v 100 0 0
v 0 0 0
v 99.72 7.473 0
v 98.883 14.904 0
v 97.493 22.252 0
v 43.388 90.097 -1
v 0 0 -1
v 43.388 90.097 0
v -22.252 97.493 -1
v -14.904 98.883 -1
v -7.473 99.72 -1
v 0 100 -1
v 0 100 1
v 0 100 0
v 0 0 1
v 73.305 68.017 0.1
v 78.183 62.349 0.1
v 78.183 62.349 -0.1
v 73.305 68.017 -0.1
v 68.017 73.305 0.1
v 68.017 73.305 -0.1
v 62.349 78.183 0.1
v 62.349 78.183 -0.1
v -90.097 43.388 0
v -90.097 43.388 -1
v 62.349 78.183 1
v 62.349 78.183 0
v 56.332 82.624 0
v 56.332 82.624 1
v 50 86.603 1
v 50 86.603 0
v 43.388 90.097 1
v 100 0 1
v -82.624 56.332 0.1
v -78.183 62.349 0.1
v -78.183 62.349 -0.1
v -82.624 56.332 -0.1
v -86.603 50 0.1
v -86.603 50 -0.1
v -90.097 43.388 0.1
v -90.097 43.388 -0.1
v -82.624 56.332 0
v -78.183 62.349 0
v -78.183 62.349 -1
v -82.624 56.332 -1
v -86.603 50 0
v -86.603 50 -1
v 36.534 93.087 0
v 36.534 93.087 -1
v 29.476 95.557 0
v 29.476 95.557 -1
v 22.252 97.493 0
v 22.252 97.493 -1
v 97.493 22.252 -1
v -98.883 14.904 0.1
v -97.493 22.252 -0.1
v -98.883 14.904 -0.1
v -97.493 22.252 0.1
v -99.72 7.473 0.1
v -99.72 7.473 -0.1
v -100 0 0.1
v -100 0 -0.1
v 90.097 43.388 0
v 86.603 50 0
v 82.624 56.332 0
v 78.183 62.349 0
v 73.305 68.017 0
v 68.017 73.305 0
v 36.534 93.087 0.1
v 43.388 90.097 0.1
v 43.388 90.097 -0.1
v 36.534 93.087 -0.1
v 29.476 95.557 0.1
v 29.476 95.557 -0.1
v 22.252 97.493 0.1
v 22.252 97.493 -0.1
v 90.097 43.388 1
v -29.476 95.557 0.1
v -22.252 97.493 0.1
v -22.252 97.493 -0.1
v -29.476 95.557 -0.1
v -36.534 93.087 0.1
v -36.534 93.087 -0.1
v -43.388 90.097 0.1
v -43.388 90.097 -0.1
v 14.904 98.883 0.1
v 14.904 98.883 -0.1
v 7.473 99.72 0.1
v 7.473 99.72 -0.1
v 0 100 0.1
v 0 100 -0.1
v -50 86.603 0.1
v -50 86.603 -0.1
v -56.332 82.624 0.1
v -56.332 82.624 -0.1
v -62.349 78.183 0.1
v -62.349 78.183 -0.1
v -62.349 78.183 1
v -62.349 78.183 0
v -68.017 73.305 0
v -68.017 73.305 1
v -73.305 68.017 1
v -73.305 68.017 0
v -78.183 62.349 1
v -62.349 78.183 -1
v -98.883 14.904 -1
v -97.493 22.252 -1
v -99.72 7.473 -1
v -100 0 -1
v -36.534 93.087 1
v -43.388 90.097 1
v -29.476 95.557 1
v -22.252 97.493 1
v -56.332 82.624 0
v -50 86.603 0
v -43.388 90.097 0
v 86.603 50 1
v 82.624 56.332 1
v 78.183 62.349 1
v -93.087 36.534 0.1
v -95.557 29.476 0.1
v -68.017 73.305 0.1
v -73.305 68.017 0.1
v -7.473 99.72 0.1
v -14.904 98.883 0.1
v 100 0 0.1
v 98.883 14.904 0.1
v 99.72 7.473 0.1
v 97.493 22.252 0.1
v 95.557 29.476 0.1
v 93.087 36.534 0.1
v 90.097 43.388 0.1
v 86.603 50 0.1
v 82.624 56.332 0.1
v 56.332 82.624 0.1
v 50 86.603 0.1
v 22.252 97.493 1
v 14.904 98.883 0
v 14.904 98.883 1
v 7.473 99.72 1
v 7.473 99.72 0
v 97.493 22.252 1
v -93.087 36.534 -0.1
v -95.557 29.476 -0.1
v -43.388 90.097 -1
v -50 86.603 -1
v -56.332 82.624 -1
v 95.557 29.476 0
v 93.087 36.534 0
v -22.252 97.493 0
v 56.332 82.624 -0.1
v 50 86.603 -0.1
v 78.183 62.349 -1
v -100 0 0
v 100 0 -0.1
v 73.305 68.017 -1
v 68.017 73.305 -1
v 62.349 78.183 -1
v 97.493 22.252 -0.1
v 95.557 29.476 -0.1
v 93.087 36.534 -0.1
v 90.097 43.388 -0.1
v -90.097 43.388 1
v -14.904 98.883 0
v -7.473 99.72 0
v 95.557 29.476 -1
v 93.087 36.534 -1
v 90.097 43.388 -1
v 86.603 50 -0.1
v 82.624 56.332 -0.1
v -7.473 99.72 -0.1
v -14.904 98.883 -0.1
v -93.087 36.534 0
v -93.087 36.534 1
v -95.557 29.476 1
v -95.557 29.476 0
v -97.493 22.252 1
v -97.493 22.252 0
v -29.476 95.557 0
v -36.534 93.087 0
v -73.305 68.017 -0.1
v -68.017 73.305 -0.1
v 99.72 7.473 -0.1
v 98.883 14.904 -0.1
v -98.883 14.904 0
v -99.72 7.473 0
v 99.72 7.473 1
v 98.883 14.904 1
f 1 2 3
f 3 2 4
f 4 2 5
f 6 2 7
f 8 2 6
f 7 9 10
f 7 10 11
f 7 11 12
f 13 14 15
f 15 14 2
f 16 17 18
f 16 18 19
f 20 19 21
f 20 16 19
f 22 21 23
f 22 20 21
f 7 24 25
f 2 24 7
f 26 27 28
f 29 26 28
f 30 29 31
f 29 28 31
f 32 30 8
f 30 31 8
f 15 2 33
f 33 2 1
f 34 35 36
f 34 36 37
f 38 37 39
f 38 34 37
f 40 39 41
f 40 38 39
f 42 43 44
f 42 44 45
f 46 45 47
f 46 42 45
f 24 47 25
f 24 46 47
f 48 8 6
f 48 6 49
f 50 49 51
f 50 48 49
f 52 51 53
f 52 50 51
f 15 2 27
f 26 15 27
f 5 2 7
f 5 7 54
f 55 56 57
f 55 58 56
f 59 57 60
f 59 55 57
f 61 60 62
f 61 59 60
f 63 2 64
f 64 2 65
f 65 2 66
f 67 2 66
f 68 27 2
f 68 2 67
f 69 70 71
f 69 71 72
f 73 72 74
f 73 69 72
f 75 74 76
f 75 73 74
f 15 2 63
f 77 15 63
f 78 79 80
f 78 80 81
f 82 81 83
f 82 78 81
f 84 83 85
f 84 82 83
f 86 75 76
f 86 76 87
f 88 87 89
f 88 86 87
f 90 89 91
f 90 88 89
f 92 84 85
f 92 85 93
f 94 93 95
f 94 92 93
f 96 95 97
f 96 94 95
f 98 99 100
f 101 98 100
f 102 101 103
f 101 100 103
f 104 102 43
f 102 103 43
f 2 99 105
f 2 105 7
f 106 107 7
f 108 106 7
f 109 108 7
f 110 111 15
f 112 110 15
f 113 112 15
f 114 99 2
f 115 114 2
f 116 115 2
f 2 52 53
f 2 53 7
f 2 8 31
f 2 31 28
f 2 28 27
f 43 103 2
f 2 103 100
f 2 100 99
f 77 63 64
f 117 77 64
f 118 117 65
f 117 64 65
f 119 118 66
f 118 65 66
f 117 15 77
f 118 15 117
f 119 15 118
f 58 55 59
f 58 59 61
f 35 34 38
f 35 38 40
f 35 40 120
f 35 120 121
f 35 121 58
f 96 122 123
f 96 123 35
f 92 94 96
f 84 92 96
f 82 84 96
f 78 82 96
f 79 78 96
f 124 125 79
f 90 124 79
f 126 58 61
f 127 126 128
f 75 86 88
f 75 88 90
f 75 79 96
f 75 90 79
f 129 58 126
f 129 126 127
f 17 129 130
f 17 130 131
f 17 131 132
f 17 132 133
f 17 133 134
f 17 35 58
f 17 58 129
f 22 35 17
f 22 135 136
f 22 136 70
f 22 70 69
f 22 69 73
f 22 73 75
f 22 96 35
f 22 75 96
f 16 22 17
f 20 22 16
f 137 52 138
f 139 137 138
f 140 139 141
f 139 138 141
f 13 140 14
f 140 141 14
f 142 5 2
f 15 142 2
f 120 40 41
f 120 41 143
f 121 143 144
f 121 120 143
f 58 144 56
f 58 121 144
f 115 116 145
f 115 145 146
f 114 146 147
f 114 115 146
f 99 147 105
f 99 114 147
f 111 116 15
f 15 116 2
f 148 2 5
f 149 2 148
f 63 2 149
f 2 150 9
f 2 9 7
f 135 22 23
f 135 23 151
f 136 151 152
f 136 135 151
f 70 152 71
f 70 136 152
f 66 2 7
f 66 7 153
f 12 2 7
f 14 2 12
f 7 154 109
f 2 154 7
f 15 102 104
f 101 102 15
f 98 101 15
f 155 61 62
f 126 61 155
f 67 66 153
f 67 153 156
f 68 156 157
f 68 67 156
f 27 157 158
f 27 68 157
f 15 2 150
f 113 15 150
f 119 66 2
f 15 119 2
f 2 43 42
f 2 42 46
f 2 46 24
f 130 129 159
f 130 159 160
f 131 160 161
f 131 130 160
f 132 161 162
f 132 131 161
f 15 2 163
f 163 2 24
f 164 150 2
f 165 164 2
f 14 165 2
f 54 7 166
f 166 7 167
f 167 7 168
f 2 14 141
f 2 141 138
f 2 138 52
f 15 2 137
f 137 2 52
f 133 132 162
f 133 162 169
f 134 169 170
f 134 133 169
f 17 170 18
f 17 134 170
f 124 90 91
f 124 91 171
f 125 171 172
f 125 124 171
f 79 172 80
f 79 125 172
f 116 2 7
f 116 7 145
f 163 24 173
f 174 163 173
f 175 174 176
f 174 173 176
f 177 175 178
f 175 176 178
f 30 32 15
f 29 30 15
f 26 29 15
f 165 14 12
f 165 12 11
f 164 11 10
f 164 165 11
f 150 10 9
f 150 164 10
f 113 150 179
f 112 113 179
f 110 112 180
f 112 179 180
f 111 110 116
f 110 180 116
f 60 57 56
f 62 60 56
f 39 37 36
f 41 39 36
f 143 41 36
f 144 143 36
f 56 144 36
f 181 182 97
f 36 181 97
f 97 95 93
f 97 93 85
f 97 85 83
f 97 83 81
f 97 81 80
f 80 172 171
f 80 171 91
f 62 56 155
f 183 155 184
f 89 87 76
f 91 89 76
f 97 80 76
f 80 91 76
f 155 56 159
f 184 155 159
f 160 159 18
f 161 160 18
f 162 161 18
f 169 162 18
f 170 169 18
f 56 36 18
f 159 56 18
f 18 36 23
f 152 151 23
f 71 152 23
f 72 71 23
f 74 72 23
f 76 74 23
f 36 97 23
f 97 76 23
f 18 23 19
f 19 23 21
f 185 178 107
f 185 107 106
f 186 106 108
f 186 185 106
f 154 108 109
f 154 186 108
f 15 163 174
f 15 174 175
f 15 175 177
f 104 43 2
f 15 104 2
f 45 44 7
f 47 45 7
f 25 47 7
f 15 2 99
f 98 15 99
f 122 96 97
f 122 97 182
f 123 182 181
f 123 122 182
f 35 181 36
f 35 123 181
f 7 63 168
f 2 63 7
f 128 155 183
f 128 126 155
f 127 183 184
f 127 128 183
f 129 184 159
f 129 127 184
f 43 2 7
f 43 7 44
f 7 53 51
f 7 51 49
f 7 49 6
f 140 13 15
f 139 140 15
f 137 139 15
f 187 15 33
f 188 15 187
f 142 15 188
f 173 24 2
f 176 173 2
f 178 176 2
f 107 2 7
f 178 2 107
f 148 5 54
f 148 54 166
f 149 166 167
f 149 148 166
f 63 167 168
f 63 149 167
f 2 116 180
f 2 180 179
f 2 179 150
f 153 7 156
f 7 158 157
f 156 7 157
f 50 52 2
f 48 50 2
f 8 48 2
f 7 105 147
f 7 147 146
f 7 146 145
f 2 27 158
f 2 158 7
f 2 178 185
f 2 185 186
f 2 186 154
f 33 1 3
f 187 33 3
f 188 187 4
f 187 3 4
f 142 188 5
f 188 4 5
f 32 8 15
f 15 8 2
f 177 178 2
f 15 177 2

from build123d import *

# Parameters (mm, degrees)
F1_DEPTH = 0.1
F2_DEPTH = 1
F3_DEPTH = 1


with BuildPart() as f1:
    # F0 (on Top) → F1 (new body, symmetric)
    with BuildSketch(Plane.XY):
        with BuildLine():
            Line((97.492791, 22.252093), (0, 0))
            Line((0, 0), (100, 0))
            ThreePointArc((100, 0), (99.371221, 11.196448), (97.492791, 22.252093))
        make_face()
        with BuildLine():
            Line((-100, 0), (0, 0))
            Line((0, 0), (-97.492791, 22.252093))
            ThreePointArc((-97.492791, 22.252093), (-99.371221, 11.196448), (-100, 0))
        make_face()
        with BuildLine():
            Line((-97.492791, 22.252093), (0, 0))
            Line((0, 0), (-90.096887, 43.388374))
            ThreePointArc((-90.096887, 43.388374), (-94.388333, 33.027906), (-97.492791, 22.252093))
        make_face()
        with BuildLine():
            Line((-90.096887, 43.388374), (0, 0))
            Line((0, 0), (-78.183148, 62.34898))
            ThreePointArc((-78.183148, 62.34898), (-84.67242, 53.203208), (-90.096887, 43.388374))
        make_face()
        with BuildLine():
            Line((-78.183148, 62.34898), (0, 0))
            Line((0, 0), (-62.34898, 78.183148))
            ThreePointArc((-62.34898, 78.183148), (-70.710678, 70.710678), (-78.183148, 62.34898))
        make_face()
        with BuildLine():
            Line((-62.34898, 78.183148), (0, 0))
            Line((0, 0), (-43.388374, 90.096887))
            ThreePointArc((-43.388374, 90.096887), (-53.203208, 84.67242), (-62.34898, 78.183148))
        make_face()
        with BuildLine():
            Line((-43.388374, 90.096887), (0, 0))
            Line((0, 0), (-22.252093, 97.492791))
            ThreePointArc((-22.252093, 97.492791), (-33.027906, 94.388333), (-43.388374, 90.096887))
        make_face()
        with BuildLine():
            Line((-22.252093, 97.492791), (0, 0))
            Line((0, 0), (0, 100))
            ThreePointArc((0, 100), (-11.196448, 99.371221), (-22.252093, 97.492791))
        make_face()
        with BuildLine():
            Line((0, 100), (0, 0))
            Line((0, 0), (22.252093, 97.492791))
            ThreePointArc((22.252093, 97.492791), (11.196448, 99.371221), (0, 100))
        make_face()
        with BuildLine():
            Line((22.252093, 97.492791), (0, 0))
            Line((0, 0), (43.388374, 90.096887))
            ThreePointArc((43.388374, 90.096887), (33.027906, 94.388333), (22.252093, 97.492791))
        make_face()
        with BuildLine():
            Line((43.388374, 90.096887), (0, 0))
            Line((0, 0), (62.34898, 78.183148))
            ThreePointArc((62.34898, 78.183148), (53.203208, 84.67242), (43.388374, 90.096887))
        make_face()
        with BuildLine():
            Line((62.34898, 78.183148), (0, 0))
            Line((0, 0), (78.183148, 62.34898))
            ThreePointArc((78.183148, 62.34898), (70.710678, 70.710678), (62.34898, 78.183148))
        make_face()
        with BuildLine():
            Line((78.183148, 62.34898), (0, 0))
            Line((0, 0), (90.096887, 43.388374))
            ThreePointArc((90.096887, 43.388374), (84.67242, 53.203208), (78.183148, 62.34898))
        make_face()
        with BuildLine():
            Line((90.096887, 43.388374), (0, 0))
            Line((0, 0), (97.492791, 22.252093))
            ThreePointArc((97.492791, 22.252093), (94.388333, 33.027906), (90.096887, 43.388374))
        make_face()
    extrude(amount=F1_DEPTH, both=True)


with BuildPart() as f2:
    # F0 (on Top) → F2 (new body)
    with BuildSketch(Plane.XY):
        with BuildLine():
            Line((-100, 0), (0, 0))
            Line((0, 0), (-97.492791, 22.252093))
            ThreePointArc((-97.492791, 22.252093), (-99.371221, 11.196448), (-100, 0))
        make_face()
        with BuildLine():
            Line((-90.096887, 43.388374), (0, 0))
            Line((0, 0), (-78.183148, 62.34898))
            ThreePointArc((-78.183148, 62.34898), (-84.67242, 53.203208), (-90.096887, 43.388374))
        make_face()
        with BuildLine():
            Line((-62.34898, 78.183148), (0, 0))
            Line((0, 0), (-43.388374, 90.096887))
            ThreePointArc((-43.388374, 90.096887), (-53.203208, 84.67242), (-62.34898, 78.183148))
        make_face()
        with BuildLine():
            Line((-22.252093, 97.492791), (0, 0))
            Line((0, 0), (0, 100))
            ThreePointArc((0, 100), (-11.196448, 99.371221), (-22.252093, 97.492791))
        make_face()
        with BuildLine():
            Line((22.252093, 97.492791), (0, 0))
            Line((0, 0), (43.388374, 90.096887))
            ThreePointArc((43.388374, 90.096887), (33.027906, 94.388333), (22.252093, 97.492791))
        make_face()
        with BuildLine():
            Line((62.34898, 78.183148), (0, 0))
            Line((0, 0), (78.183148, 62.34898))
            ThreePointArc((78.183148, 62.34898), (70.710678, 70.710678), (62.34898, 78.183148))
        make_face()
        with BuildLine():
            Line((90.096887, 43.388374), (0, 0))
            Line((0, 0), (97.492791, 22.252093))
            ThreePointArc((97.492791, 22.252093), (94.388333, 33.027906), (90.096887, 43.388374))
        make_face()
    extrude(amount=-F2_DEPTH)


with BuildPart() as f3:
    # F0 (on Top) → F3 (new body)
    with BuildSketch(Plane.XY):
        with BuildLine():
            Line((-97.492791, 22.252093), (0, 0))
            Line((0, 0), (-90.096887, 43.388374))
            ThreePointArc((-90.096887, 43.388374), (-94.388333, 33.027906), (-97.492791, 22.252093))
        make_face()
        with BuildLine():
            Line((-78.183148, 62.34898), (0, 0))
            Line((0, 0), (-62.34898, 78.183148))
            ThreePointArc((-62.34898, 78.183148), (-70.710678, 70.710678), (-78.183148, 62.34898))
        make_face()
        with BuildLine():
            Line((-43.388374, 90.096887), (0, 0))
            Line((0, 0), (-22.252093, 97.492791))
            ThreePointArc((-22.252093, 97.492791), (-33.027906, 94.388333), (-43.388374, 90.096887))
        make_face()
        with BuildLine():
            Line((0, 100), (0, 0))
            Line((0, 0), (22.252093, 97.492791))
            ThreePointArc((22.252093, 97.492791), (11.196448, 99.371221), (0, 100))
        make_face()
        with BuildLine():
            Line((43.388374, 90.096887), (0, 0))
            Line((0, 0), (62.34898, 78.183148))
            ThreePointArc((62.34898, 78.183148), (53.203208, 84.67242), (43.388374, 90.096887))
        make_face()
        with BuildLine():
            Line((78.183148, 62.34898), (0, 0))
            Line((0, 0), (90.096887, 43.388374))
            ThreePointArc((90.096887, 43.388374), (84.67242, 53.203208), (78.183148, 62.34898))
        make_face()
        with BuildLine():
            Line((97.492791, 22.252093), (0, 0))
            Line((0, 0), (100, 0))
            ThreePointArc((100, 0), (99.371221, 11.196448), (97.492791, 22.252093))
        make_face()
    extrude(amount=F3_DEPTH)


solid = Compound([f1.part, f2.part, f3.part])
